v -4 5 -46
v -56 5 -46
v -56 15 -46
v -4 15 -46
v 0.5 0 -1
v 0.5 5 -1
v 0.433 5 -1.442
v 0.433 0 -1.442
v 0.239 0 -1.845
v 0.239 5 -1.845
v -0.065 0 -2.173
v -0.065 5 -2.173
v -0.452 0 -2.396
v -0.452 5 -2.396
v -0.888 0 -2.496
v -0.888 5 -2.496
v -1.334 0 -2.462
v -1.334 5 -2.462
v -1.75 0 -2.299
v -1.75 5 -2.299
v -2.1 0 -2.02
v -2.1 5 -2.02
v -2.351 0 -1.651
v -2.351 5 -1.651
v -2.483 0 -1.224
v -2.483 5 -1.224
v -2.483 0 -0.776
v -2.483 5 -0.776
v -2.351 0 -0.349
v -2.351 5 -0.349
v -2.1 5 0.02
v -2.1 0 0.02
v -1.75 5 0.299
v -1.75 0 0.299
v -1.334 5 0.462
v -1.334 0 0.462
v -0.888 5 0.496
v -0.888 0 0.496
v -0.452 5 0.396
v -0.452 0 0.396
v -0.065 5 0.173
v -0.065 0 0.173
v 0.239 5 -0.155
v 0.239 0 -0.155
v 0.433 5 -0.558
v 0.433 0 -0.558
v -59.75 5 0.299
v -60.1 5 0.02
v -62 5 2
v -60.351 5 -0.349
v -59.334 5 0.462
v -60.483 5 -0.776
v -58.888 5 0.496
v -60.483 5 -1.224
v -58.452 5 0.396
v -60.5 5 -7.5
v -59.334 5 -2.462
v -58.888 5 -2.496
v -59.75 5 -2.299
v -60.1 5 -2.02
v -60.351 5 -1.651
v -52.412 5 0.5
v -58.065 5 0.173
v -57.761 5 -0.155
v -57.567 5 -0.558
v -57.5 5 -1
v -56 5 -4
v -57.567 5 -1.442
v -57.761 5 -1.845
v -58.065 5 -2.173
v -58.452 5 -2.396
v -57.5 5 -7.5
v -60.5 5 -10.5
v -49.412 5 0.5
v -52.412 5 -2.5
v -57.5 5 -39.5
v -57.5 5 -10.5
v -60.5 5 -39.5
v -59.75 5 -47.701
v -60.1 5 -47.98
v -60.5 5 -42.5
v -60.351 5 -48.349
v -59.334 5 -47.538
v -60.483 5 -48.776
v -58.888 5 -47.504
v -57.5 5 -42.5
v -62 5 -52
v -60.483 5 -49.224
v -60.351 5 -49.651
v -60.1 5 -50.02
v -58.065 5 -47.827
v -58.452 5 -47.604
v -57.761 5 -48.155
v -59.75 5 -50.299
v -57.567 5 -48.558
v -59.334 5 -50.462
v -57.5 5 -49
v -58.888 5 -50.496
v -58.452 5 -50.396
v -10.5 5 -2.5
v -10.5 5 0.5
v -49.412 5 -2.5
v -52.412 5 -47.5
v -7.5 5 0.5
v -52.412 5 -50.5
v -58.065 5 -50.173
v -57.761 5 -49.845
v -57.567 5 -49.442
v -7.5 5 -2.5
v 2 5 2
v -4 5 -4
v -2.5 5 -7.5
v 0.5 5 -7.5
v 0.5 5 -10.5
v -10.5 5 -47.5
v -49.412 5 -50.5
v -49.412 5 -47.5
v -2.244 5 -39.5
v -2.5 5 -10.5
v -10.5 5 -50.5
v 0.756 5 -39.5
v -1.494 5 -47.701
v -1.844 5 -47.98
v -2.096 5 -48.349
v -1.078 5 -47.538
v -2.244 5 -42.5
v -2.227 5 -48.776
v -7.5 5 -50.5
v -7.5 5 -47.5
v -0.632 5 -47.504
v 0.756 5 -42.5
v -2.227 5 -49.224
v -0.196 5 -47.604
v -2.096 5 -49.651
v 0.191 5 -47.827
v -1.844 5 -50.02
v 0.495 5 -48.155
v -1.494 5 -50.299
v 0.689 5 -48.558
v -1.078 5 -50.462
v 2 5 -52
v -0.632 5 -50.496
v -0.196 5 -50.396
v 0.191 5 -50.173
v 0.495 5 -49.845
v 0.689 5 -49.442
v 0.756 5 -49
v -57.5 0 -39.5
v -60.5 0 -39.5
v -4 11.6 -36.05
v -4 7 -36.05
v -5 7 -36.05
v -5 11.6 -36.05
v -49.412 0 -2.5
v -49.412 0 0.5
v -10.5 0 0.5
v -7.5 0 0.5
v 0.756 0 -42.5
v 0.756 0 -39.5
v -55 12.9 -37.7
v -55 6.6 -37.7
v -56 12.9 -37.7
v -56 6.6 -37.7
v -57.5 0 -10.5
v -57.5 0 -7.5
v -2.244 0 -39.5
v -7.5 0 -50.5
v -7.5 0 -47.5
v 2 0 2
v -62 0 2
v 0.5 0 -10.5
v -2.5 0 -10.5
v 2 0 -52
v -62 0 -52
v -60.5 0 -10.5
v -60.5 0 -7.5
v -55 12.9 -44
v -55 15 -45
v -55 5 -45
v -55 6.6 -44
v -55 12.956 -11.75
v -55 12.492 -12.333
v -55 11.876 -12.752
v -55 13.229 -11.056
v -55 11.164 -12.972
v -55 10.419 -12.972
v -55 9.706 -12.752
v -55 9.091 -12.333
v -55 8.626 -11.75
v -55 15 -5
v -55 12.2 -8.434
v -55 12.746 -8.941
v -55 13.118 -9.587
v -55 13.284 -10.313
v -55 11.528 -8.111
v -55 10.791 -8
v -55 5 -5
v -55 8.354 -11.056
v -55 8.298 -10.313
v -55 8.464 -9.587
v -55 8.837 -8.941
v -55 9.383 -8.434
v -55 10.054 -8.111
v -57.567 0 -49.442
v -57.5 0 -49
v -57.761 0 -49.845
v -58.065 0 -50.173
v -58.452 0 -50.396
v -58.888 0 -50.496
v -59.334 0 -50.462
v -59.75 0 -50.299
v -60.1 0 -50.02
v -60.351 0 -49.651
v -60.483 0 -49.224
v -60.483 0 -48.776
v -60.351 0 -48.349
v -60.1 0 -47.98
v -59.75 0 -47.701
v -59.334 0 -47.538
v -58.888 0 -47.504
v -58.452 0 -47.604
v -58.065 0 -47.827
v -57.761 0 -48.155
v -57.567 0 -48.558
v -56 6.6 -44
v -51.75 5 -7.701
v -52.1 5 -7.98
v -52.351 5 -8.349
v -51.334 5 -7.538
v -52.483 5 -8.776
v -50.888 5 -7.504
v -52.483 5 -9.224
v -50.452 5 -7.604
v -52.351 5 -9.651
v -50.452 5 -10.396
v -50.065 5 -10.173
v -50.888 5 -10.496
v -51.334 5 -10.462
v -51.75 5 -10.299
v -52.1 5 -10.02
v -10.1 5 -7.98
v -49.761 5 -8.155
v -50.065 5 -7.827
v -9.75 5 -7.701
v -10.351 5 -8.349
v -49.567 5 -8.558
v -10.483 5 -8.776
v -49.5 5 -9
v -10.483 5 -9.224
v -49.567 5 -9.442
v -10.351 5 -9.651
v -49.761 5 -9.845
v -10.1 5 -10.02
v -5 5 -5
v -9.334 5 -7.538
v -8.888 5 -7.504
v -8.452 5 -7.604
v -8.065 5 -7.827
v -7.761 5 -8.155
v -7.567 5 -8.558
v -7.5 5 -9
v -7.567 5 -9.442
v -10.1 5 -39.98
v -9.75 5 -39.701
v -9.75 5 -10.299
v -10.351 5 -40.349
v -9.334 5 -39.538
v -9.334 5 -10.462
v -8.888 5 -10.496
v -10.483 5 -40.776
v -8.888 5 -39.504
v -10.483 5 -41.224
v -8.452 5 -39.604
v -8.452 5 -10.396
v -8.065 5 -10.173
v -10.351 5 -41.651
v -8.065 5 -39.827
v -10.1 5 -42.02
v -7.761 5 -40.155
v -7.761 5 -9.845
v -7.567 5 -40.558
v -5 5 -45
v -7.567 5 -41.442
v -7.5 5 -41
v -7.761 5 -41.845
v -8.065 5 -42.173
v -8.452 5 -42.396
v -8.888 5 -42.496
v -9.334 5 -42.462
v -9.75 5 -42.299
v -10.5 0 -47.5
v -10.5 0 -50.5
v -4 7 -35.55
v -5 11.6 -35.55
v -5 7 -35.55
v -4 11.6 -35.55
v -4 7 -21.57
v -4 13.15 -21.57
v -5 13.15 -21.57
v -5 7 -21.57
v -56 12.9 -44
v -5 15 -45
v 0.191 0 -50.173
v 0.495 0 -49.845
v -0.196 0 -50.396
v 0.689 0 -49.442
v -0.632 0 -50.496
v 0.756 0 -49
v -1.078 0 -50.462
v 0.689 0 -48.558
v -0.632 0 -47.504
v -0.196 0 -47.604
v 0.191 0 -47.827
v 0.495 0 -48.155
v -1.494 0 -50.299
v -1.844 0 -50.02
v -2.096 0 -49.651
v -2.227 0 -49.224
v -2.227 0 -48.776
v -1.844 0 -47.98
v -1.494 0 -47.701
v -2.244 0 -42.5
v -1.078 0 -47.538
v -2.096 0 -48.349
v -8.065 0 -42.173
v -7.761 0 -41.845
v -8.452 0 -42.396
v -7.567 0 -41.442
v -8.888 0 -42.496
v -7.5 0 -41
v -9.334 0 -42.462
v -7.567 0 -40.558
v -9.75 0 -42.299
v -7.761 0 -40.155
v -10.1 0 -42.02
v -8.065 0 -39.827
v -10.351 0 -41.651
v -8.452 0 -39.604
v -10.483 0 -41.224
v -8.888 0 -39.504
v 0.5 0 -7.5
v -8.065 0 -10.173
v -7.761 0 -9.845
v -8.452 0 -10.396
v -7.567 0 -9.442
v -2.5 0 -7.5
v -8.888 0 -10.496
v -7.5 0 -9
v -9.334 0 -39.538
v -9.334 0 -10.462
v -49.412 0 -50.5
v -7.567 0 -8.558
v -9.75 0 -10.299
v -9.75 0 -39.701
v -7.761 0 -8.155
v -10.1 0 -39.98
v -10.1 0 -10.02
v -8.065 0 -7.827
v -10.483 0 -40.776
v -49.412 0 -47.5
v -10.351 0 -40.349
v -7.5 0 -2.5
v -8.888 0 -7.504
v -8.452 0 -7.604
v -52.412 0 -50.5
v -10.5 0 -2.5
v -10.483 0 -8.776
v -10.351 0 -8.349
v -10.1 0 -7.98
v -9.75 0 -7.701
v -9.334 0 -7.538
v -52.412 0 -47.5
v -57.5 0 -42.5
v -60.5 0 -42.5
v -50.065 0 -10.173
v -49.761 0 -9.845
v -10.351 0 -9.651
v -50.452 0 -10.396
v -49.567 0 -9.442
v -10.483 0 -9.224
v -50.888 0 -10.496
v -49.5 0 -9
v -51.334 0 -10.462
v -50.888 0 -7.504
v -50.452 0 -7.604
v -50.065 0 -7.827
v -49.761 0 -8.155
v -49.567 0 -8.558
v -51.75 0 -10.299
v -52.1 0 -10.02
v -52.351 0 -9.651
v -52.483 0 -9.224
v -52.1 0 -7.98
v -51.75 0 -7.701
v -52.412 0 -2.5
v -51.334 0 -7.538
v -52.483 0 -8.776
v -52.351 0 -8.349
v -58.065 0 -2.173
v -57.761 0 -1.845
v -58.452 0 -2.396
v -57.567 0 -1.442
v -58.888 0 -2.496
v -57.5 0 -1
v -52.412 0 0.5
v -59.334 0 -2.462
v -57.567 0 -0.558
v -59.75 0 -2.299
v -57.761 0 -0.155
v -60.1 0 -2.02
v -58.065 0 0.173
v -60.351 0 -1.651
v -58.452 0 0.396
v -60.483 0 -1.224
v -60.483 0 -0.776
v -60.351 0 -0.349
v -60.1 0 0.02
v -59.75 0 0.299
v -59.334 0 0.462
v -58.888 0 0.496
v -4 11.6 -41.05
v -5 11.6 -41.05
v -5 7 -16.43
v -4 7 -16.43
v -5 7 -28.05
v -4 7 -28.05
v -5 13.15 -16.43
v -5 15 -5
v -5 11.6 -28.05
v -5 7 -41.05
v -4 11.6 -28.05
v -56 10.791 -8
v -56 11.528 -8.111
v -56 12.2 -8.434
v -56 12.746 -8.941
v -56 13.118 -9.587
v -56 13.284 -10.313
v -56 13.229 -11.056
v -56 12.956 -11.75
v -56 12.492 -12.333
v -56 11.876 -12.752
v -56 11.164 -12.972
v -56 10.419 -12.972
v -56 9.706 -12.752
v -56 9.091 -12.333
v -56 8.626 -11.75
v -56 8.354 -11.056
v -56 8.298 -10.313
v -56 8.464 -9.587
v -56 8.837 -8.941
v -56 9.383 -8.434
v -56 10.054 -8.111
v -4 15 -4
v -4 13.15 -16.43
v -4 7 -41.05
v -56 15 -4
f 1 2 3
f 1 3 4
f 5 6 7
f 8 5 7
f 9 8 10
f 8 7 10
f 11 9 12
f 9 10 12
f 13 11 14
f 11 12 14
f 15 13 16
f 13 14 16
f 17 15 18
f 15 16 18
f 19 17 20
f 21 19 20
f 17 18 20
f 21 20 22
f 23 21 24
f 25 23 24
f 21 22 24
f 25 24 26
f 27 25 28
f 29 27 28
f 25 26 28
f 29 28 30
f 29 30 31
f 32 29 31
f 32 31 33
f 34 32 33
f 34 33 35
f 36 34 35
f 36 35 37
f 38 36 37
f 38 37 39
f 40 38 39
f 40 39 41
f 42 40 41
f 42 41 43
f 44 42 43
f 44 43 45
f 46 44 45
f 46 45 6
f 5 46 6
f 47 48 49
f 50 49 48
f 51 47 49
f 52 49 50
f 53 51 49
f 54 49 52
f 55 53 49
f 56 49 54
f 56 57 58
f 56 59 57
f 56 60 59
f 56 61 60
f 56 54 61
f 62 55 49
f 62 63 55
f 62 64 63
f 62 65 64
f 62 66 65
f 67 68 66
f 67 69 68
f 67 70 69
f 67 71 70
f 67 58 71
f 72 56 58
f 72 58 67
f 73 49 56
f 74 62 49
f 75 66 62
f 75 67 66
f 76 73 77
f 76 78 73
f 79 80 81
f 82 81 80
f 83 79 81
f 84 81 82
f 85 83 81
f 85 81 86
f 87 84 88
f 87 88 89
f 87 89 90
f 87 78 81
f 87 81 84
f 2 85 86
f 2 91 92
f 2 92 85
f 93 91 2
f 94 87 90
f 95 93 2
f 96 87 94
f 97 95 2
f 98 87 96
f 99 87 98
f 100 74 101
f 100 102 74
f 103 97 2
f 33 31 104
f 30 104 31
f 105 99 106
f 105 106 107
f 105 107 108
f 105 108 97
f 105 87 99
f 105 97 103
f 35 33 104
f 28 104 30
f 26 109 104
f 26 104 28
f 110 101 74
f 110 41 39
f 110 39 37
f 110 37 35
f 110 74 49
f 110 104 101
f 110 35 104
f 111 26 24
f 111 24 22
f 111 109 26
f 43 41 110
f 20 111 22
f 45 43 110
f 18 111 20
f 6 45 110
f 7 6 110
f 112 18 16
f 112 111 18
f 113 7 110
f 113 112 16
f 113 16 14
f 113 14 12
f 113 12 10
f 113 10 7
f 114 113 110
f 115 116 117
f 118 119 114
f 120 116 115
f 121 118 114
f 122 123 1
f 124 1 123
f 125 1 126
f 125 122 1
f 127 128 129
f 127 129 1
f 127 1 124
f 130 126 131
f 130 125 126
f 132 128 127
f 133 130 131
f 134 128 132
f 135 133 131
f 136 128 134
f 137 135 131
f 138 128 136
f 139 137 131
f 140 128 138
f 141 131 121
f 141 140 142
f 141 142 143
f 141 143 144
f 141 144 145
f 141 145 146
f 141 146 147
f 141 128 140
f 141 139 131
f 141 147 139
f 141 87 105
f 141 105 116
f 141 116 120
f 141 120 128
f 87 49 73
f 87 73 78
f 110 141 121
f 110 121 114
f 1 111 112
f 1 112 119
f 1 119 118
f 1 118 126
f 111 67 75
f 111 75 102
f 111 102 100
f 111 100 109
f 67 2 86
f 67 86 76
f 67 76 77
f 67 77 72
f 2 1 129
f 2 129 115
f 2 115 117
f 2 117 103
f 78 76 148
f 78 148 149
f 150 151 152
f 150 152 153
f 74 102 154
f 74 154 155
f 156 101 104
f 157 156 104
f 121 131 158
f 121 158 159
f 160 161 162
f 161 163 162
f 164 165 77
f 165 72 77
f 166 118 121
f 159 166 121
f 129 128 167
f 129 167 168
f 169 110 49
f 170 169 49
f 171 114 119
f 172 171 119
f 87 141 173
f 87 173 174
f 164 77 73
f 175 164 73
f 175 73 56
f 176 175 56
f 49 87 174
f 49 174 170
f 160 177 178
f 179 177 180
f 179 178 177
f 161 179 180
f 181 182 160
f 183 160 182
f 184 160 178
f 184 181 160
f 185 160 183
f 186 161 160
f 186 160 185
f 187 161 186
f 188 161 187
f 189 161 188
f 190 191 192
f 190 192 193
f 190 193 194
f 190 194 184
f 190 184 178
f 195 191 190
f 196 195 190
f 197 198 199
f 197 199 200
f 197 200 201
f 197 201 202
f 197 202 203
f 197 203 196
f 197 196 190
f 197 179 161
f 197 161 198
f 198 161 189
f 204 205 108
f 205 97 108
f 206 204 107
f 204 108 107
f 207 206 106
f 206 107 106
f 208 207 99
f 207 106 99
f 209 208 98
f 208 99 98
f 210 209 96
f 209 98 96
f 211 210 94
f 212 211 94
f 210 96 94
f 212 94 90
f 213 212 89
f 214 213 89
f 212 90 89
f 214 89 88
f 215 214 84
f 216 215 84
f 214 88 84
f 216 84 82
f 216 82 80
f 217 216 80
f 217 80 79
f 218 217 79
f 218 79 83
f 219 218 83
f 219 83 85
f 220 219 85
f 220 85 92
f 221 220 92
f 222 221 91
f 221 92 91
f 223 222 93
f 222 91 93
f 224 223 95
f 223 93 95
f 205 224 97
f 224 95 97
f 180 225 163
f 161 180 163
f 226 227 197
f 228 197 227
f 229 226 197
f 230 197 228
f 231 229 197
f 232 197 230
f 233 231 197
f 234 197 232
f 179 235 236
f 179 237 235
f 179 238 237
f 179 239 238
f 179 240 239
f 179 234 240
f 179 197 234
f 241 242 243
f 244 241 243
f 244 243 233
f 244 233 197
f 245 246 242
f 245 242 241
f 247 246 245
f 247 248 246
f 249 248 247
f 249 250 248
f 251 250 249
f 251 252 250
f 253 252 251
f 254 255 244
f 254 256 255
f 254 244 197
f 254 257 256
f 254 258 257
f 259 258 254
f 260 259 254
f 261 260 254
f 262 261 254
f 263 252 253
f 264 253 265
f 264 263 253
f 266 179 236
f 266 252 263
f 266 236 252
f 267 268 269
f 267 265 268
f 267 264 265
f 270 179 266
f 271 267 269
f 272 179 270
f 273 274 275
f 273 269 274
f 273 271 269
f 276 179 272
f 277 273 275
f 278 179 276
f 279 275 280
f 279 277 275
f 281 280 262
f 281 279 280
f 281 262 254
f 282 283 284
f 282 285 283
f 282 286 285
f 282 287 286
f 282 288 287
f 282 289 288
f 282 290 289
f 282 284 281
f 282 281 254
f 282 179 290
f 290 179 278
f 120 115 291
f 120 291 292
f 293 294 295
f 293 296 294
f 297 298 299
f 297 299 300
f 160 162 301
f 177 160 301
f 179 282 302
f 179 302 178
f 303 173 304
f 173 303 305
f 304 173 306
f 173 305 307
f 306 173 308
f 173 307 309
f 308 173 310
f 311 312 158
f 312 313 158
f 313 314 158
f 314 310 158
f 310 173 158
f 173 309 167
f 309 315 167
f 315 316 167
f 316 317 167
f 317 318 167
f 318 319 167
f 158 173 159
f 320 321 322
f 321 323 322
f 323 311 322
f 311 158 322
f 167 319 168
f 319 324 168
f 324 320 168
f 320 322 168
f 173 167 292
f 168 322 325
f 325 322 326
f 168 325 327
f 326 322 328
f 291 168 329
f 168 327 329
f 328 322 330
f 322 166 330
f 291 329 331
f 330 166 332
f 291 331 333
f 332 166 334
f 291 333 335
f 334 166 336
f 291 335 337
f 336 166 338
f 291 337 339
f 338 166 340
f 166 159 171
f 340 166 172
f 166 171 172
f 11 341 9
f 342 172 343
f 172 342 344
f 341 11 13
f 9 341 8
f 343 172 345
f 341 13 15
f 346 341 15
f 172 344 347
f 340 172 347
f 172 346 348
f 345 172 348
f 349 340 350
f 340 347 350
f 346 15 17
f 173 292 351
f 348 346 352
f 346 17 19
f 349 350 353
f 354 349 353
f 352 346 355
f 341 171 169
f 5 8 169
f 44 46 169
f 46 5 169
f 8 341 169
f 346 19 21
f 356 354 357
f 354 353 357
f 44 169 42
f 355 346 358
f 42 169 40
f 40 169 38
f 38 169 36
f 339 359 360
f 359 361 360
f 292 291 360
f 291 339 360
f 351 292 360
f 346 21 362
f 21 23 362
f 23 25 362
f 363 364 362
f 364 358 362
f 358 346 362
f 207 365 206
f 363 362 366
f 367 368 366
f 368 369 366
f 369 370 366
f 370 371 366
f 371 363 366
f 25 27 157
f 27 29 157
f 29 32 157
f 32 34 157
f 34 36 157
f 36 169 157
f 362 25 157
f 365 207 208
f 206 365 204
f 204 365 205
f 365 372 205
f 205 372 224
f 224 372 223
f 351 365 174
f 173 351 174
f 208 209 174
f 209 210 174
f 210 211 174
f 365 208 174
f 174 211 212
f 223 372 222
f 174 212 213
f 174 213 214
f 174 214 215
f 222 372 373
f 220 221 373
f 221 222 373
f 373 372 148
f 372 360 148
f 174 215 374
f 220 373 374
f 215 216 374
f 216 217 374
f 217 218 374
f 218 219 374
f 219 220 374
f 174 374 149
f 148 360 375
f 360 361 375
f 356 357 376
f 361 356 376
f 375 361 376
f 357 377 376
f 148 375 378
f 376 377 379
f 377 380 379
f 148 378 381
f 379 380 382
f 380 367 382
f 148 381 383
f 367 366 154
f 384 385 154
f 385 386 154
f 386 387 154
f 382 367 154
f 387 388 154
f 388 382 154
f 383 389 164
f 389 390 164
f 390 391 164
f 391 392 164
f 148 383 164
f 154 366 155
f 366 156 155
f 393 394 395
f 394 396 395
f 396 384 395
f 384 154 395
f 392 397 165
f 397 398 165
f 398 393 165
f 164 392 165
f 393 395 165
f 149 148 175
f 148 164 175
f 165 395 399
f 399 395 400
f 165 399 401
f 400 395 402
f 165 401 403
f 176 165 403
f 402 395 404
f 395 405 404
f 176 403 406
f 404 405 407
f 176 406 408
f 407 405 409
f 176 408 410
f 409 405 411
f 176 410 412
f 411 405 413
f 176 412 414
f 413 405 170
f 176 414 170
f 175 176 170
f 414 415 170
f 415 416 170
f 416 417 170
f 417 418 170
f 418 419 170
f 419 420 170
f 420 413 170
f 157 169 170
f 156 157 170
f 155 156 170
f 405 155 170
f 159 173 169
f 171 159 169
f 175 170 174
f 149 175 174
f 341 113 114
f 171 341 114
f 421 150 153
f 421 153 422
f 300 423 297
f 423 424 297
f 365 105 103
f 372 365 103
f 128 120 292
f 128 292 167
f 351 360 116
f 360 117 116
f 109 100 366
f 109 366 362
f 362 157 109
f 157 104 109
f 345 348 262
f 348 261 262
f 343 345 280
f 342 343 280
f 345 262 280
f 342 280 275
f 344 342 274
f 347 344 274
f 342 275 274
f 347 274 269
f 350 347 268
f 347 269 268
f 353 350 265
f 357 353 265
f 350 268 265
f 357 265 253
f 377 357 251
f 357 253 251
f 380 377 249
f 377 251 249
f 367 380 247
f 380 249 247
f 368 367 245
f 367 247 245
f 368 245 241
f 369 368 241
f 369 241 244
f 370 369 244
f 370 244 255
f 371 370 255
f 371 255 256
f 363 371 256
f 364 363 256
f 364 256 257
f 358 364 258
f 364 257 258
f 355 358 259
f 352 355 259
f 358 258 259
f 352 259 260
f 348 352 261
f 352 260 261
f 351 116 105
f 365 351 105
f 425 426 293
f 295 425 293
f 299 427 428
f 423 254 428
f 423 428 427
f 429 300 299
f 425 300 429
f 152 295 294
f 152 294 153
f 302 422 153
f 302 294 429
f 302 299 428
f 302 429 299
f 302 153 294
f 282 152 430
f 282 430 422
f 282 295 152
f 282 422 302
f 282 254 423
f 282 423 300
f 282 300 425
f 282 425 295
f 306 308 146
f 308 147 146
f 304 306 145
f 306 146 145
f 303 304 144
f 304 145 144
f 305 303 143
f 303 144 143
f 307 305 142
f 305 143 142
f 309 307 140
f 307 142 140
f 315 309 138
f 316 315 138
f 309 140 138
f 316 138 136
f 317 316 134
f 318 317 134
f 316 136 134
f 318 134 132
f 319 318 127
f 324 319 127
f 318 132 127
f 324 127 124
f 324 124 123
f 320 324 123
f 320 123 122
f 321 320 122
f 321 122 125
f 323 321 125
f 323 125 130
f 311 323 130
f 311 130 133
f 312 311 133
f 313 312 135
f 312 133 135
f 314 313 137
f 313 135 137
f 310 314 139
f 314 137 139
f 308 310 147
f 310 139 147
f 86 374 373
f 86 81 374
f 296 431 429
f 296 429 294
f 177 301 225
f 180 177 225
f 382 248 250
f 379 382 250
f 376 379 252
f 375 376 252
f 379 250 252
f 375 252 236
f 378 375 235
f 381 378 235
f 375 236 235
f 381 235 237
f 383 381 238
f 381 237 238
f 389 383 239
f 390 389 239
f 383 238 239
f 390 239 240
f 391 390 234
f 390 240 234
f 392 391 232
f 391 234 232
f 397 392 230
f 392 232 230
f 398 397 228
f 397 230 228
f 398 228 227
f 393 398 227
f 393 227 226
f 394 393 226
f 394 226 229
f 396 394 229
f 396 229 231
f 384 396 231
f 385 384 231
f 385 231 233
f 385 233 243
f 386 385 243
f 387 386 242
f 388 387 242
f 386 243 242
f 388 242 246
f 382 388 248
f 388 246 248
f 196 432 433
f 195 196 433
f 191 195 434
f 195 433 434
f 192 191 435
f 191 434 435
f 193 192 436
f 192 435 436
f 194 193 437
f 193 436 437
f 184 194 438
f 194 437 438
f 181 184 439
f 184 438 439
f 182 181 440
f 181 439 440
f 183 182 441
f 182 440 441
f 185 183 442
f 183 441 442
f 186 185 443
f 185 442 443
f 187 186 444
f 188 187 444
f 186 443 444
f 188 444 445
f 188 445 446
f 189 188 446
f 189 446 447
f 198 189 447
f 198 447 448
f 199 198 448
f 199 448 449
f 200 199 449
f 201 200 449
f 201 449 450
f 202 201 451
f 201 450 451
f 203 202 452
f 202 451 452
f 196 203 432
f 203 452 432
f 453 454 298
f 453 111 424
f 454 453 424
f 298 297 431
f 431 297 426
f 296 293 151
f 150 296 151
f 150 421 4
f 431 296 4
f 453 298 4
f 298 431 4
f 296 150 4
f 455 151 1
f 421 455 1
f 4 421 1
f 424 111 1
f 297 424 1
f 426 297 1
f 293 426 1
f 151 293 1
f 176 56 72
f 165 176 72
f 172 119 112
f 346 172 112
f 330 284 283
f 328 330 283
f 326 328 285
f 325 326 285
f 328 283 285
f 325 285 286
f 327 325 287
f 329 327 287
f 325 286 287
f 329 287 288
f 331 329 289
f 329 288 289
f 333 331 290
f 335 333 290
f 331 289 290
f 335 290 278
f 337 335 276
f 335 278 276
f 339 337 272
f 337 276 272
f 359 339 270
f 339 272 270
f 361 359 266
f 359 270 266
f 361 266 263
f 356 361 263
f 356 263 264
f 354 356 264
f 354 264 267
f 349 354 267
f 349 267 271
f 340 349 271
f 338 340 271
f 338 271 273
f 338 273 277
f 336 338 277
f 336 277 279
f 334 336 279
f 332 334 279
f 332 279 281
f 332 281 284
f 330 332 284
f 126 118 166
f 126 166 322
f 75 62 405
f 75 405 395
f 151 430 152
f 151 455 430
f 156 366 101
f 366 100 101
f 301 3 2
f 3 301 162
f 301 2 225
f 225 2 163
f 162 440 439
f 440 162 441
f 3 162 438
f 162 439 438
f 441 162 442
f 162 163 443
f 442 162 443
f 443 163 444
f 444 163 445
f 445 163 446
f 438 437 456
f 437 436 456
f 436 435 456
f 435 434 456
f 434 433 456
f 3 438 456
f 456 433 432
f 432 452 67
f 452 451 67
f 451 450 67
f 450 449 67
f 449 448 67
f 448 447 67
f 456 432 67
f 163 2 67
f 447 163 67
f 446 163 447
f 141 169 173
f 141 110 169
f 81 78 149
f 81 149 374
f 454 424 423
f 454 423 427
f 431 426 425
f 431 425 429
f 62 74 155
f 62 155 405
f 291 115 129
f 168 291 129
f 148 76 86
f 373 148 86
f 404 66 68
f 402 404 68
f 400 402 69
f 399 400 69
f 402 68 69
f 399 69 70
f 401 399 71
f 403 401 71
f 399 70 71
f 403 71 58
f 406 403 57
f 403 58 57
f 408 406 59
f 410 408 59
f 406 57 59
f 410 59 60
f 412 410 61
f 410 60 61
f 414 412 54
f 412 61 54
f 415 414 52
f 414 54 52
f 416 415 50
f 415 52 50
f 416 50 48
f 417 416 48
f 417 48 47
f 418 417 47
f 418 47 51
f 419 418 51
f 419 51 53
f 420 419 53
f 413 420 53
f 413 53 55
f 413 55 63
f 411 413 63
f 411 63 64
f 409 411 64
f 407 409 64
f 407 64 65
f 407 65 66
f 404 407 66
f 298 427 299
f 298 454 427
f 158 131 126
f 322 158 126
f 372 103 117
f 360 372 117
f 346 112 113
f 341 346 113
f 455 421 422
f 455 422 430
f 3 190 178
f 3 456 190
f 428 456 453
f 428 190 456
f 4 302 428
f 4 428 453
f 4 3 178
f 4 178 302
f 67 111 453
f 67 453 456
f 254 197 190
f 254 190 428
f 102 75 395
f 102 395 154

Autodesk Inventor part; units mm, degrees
ref_plane "YZ Plane" through (0, 0, 0) normal (1, 0, 0) x (0, 1, 0)
ref_plane "XZ Plane" through (0, 0, 0) normal (0, 1, 0) x (-1, 0, 0)
ref_plane "XY Plane" through (0, 0, 0) normal (0, 0, 1) x (1, 0, 0)
sketch "Sketch1" plane through (0, 0, 0) normal (0, 1, 0) x (-1, 0, 0)
  line L0 (0, 0) -> (60, 0)
  line L1 (60, 0) -> (60, -50)
  line L2 (60, -50) -> (0, -50)
  line L3 (0, -50) -> (0, 0)
  line L4 (60, 0) -> (0, 0)
  line L5 (0, 0) -> (0, -5)
  line L6 (0, -5) -> (60, -5)
  line L7 (60, -5) -> (60, 0)
  line L8 (60, 0) -> (55, 0)
  line L9 (55, 0) -> (55, -50)
  line L10 (55, -50) -> (60, -50)
  line L11 (60, -50) -> (60, 0)
  line L12 (60, -50) -> (0, -50)
  line L13 (0, -50) -> (0, -45)
  line L14 (0, -45) -> (60, -45)
  line L15 (60, -45) -> (60, -50)
  line L16 (0, -50) -> (5, -50)
  line L17 (5, -50) -> (5, 0)
  line L18 (5, 0) -> (0, 0)
  line L19 (0, 0) -> (0, -50)
  line L20 (5, -5) -> (55, -5)
  line L21 (55, -5) -> (55, -45)
  line L22 (55, -45) -> (5, -45)
  line L23 (5, -45) -> (5, -5)
  dimension "d0" = 60
  dimension "d1" = 50
  dimension "d2" = 5
  dimension "d3" = 5
  dimension "d4" = 5
  dimension "d5" = 5
  dimension "d6" = 40
  dimension "d7" = 50
extrude "Extrusion1" add sketch "Sketch1" along normal blind 5
sketch "Sketch2" plane through (0, 5, 0) normal (0, 1, 0) x (1, 0, 0)
  line L0 (-60, 50) -> (-60, 0) projected
  line L1 (0, 50) -> (-60, 50) projected
  line L2 (-60, 0) -> (0, 0)
  line L3 (0, 0) -> (0, 50)
  line L4 (0, 50) -> (-60, 50)
  line L5 (-60, 50) -> (-60, 0)
  line L6 (0, 0) -> (0, 50) projected
  line L7 (-60, 0) -> (0, 0)
  line L8 (0, 0) -> (0, 5)
  line L9 (0, 5) -> (-60, 5)
  line L10 (-60, 5) -> (-60, 0)
  line L11 (0, 50) -> (-60, 50)
  line L12 (-60, 50) -> (-60, 45)
  line L13 (-60, 45) -> (0, 45)
  line L14 (0, 45) -> (0, 50)
  line L15 (-60, 0) -> (0, 0) projected
  line L16 (-60, 50) -> (-55, 50)
  line L17 (-55, 50) -> (-55, 0)
  line L18 (-55, 0) -> (-60, 0)
  line L19 (-60, 0) -> (-60, 50)
  line L20 (0, 0) -> (-5, 0)
  line L21 (-5, 0) -> (-5, 50)
  line L22 (-5, 50) -> (0, 50)
  line L23 (0, 50) -> (0, 0)
  line L24 (-55, 5) -> (-56.5, 5)
  line L25 (-56.5, 5) -> (-56.5, 3.5)
  line L26 (-56.5, 3.5) -> (-55, 3.5)
  line L27 (-55, 3.5) -> (-55, 5)
  line L28 (-60, 0) -> (-62, 0)
  line L29 (-62, 0) -> (-62, 50)
  line L30 (-62, 50) -> (-60, 50)
  line L31 (-60, 50) -> (-60, 0)
  line L32 (-62, 0) -> (0, 0)
  line L33 (0, 0) -> (0, -2)
  line L34 (0, -2) -> (-62, -2)
  line L35 (-62, -2) -> (-62, 0)
  line L36 (-62, 50) -> (2, 50)
  line L37 (2, 50) -> (2, 52)
  line L38 (2, 52) -> (-62, 52)
  line L39 (-62, 52) -> (-62, 50)
  line L40 (2, 50) -> (0, 50)
  line L41 (0, 50) -> (0, -2)
  line L42 (0, -2) -> (2, -2)
  line L43 (2, -2) -> (2, 50)
  dimension "d10" = 5
  dimension "d11" = 5
  dimension "d12" = 5
  dimension "d13" = 5
  dimension "d14" = 1.5
  dimension "d15" = 1.5
  dimension "d16" = 2
  dimension "d17" = 2
  dimension "d18" = 64
  dimension "d19" = 2
extrude "Extrusion2" add sketch "Sketch2" against normal blind 5 contours L30 L39 L38 L37 L36 L1 | L0 L28 L29 L30 | L28 L2 L33 L34 L35 | L36 L43 L42 L33 L3
sketch "Sketch3" plane through (0, 5, 0) normal (0, 1, 0) x (1, 0, 0)
  line L0 (2, -2) -> (-62, -2) projected
  line L1 (2, 52) -> (2, -2) projected
  line L2 (-62, -2) -> (2, -2)
  line L3 (2, -2) -> (2, 52)
  line L4 (2, 52) -> (-62, 52)
  line L5 (-62, 52) -> (-62, -2)
  line L6 (-62, -2) -> (2, -2)
  line L7 (2, -2) -> (2, 4)
  line L8 (2, 4) -> (-62, 4)
  line L9 (-62, 4) -> (-62, -2)
  line L10 (2, 52) -> (-62, 52)
  line L11 (-62, 52) -> (-62, 46)
  line L12 (-62, 46) -> (2, 46)
  line L13 (2, 46) -> (2, 52)
  line L14 (-62, -2) -> (-62, 52) projected
  line L15 (-62, 52) -> (-56, 52)
  line L16 (-56, 52) -> (-56, -2)
  line L17 (-56, -2) -> (-62, -2)
  line L18 (-62, -2) -> (-62, 52)
  line L19 (-62, 52) -> (2, 52) projected
  line L20 (2, -2) -> (-4, -2)
  line L21 (-4, -2) -> (-4, 52)
  line L22 (-4, 52) -> (2, 52)
  line L23 (2, 52) -> (2, -2)
  line L24 (-4, 46) -> (-54, 46)
  line L25 (-54, 46) -> (-54, 6)
  line L26 (-54, 6) -> (-4, 6)
  line L27 (-4, 6) -> (-4, 46)
  line L28 (-56, 4) -> (-6, 4)
  line L29 (-6, 4) -> (-6, 44)
  line L30 (-6, 44) -> (-56, 44)
  line L31 (-56, 44) -> (-56, 4)
  line L32 (-56, 4) -> (-5, 4)
  line L33 (-5, 4) -> (-5, 45)
  line L34 (-5, 45) -> (-56, 45)
  line L35 (-56, 45) -> (-56, 4)
  line L36 (-4, 46) -> (-55, 46)
  line L37 (-55, 46) -> (-55, 5)
  line L38 (-55, 5) -> (-4, 5)
  line L39 (-4, 5) -> (-4, 46)
  line L40 (-4, 5) -> (-56, 5)
  line L41 (-56, 5) -> (-56, 4)
  line L42 (-56, 4) -> (-4, 4)
  line L43 (-4, 4) -> (-4, 5)
  line L44 (-56, 4) -> (-55, 4)
  line L45 (-55, 4) -> (-55, 46)
  line L46 (-55, 46) -> (-56, 46)
  line L47 (-56, 46) -> (-56, 4)
  line L48 (-56, 45) -> (-4, 45)
  line L49 (-4, 45) -> (-4, 46)
  line L50 (-4, 46) -> (-56, 46)
  line L51 (-56, 46) -> (-56, 45)
  line L52 (-4, 46) -> (-5, 46)
  line L53 (-5, 46) -> (-5, 4)
  line L54 (-5, 4) -> (-4, 4)
  line L55 (-4, 4) -> (-4, 46)
  point P0 (0, 0)
  point P1 (-4, 4)
  point P2 (-55, 45)
  point P3 (-5, 5)
  point P4 (-55, 5)
  dimension "d22" = 6
  dimension "d23" = 6
  dimension "d24" = 6
  dimension "d25" = 6
  dimension "d26" = 50
  dimension "d27" = 40
  dimension "d28" = 50
  dimension "d29" = 40
  dimension "d30" = 51
  dimension "d31" = 41
  dimension "d32" = 51
  dimension "d33" = 41
  dimension "d34" = 40
  dimension "d35" = 50
extrude "Extrusion3" add sketch "Sketch3" along normal blind 10 contours L8 L33 L38 L21 | L16 L40 L45 L8 | L8 L29 L38 L33 | L38 L33 L26 L21 | L21 L48 L53 L12 | L45 L38 L29 L8 | L16 L30 L37 L40 | L26 L33 L48 L21 | L53 L34 L25 L12 | L16 L34 L37 L30 | L25 L34 L37 L12 | L12 L37 L34 L16
sketch "Sketch5" plane through (0, 5, 0) normal (0, 1, 0) x (1, 0, 0)
  line L0 (-55, 5) -> (-55, 45) projected
  line L1 (-55, 45) -> (-5, 45) projected
  line L2 (-55, 5) -> (-5, 5)
  line L3 (-5, 5) -> (-5, 45)
  line L4 (-5, 45) -> (-55, 45)
  line L5 (-55, 45) -> (-55, 5)
  line L6 (-55, 5) -> (-51, 5)
  line L7 (-55, 9) -> (-55, 5)
  circle A0 centre (-51, 9) radius 1.5
  line L8 (-5, 45) -> (-5, 5) projected
  line L9 (-5, 5) -> (-9, 5)
  line L10 (-5, 9) -> (-5, 5)
  line L11 (-5, 45) -> (-9, 45)
  line L12 (-5, 41) -> (-5, 45)
  line L13 (-55, 45) -> (-51, 45)
  line L14 (-55, 41) -> (-55, 45)
  circle A1 centre (-9, 41) radius 1.5
  circle A2 centre (-9, 9) radius 1.5
  point P0 (0, 0)
extrude "Extrusion4" cut sketch "Sketch5" against normal blind 10 contours A0 | A1 | A2
sketch "Sketch6" plane through (-4, 5, -4) normal (1, 0, 0) x (0, 0, -1)
  line L0 (0, 10) -> (1, 10)
  line L1 (1, 10) -> (1, 0)
  line L2 (1, 0) -> (0, 0)
  line L3 (0, 0) -> (0, 10)
  line L4 (41, 10) -> (42, 10)
  line L5 (42, 10) -> (42, 0)
  line L6 (42, 0) -> (41, 0)
  line L7 (41, 0) -> (41, 10)
  line L8 (1, 0) -> (6, 0)
  line L9 (6, 0) -> (6, 2)
  line L10 (1, 2) -> (1, 0)
  line L11 (6, 2) -> (24, 2)
  line L12 (24, 2) -> (24, 0)
  line L13 (24, 0) -> (6, 0)
  line L14 (6, 0) -> (6, 2)
  line L15 (1, 0) -> (41, 0) projected
  line L16 (6, 2) -> (11.05, 2)
  line L17 (11.05, 0) -> (6, 0)
  line L18 (6, 0) -> (6, 2)
  line L19 (24, 0) -> (18.95, 0)
  line L20 (18.95, 2) -> (24, 2)
  line L21 (24, 2) -> (24, 0)
  line L22 (6, 2) -> (15, 2)
  line L23 (15, 2) -> (15, 0)
  line L24 (15, 0) -> (6, 0)
  line L25 (6, 0) -> (6, 2)
  line L26 (24, 0) -> (15, 0)
  line L27 (15, 0) -> (15, 2)
  line L28 (15, 2) -> (24, 2)
  line L29 (24, 2) -> (24, 0)
  line L30 (15, 2) -> (12.525, 2)
  line L31 (12.525, 2) -> (12.525, 0)
  line L32 (12.525, 0) -> (15, 0)
  line L33 (15, 0) -> (15, 2)
  line L34 (15, 2) -> (17.475, 2)
  line L35 (17.475, 2) -> (17.475, 0)
  line L36 (17.475, 0) -> (15, 0)
  line L37 (15, 0) -> (15, 2)
  line L38 (24, 0) -> (24.05, 0)
  line L39 (24.05, 0) -> (24.05, 2)
  line L40 (24, 2) -> (24, 0)
  line L41 (24.05, 2) -> (31.55, 2)
  line L42 (31.55, 2) -> (31.55, 0)
  line L43 (31.55, 0) -> (24.05, 0)
  line L44 (24.05, 0) -> (24.05, 2)
  line L45 (32.05, 2) -> (32.05, 0)
  line L46 (32.05, 0) -> (31.55, 0)
  line L47 (31.55, 0) -> (31.55, 2)
  line L48 (32.05, 0) -> (37.05, 0)
  line L49 (37.05, 0) -> (37.05, 2)
  line L50 (37.05, 2) -> (32.05, 2)
  line L51 (32.05, 2) -> (32.05, 0)
  line L52 (1, 0) -> (1, 10) projected
  line L53 (41, 0) -> (1, 0)
  line L54 (1, 0) -> (1, 1.6)
  line L55 (1, 1.6) -> (41, 1.6)
  line L56 (41, 1.6) -> (41, 0)
  line L57 (37.05, 2) -> (32.05, 2)
  line L58 (32.05, 2) -> (32.05, 1.6)
  line L59 (32.05, 1.6) -> (37.05, 1.6)
  line L60 (37.05, 1.6) -> (37.05, 2)
  line L61 (37.05, 2) -> (32.05, 2)
  line L62 (32.05, 2) -> (32.05, 1.6)
  line L63 (32.05, 1.6) -> (37.05, 1.6)
  line L64 (37.05, 1.6) -> (37.05, 2)
  line L65 (37.05, 1.6) -> (32.05, 1.6)
  line L66 (32.05, 1.6) -> (32.05, 6.6)
  line L67 (32.05, 6.6) -> (37.05, 6.6)
  line L68 (37.05, 6.6) -> (37.05, 1.6)
  line L69 (17.475, 2) -> (12.525, 2)
  line L70 (12.525, 2) -> (12.525, 1.6)
  line L71 (12.525, 1.6) -> (17.475, 1.6)
  line L72 (17.475, 1.6) -> (17.475, 2)
  line L73 (15, 1.6) -> (17.57, 1.6)
  line L74 (17.57, 1.6) -> (17.57, 2)
  line L75 (17.57, 2) -> (15, 2)
  line L76 (15, 2) -> (15, 1.6)
  line L77 (15, 1.6) -> (12.43, 1.6)
  line L78 (12.43, 1.6) -> (12.43, 2)
  line L79 (12.43, 2) -> (15, 2)
  line L80 (15, 2) -> (15, 1.6)
  line L81 (17.57, 1.6) -> (12.43, 1.6)
  line L82 (12.43, 1.6) -> (12.43, 8.15)
  line L83 (12.43, 8.15) -> (17.57, 8.15)
  line L84 (17.57, 8.15) -> (17.57, 1.6)
  line L85 (31.55, 1.6) -> (24.05, 1.6)
  line L86 (24.05, 1.6) -> (24.05, 6.6)
  line L87 (24.05, 6.6) -> (31.55, 6.6)
  line L88 (31.55, 6.6) -> (31.55, 1.6)
  point P0 (-4, -5)
  point P1 (32.05, 2)
  point P2 (37.05, 2)
  point P3 (24.05, 2)
  point P4 (31.55, 2)
  point P5 (12.43, 2)
  point P6 (17.57, 2)
  dimension "d48" = 5.05
  dimension "d53" = 7.5
  dimension "d54" = 0.5
  dimension "d55" = 5
  dimension "d58" = 1.6
  dimension "d59" = 5
  dimension "d60" = 5
  dimension "d61" = 2.57
  dimension "d62" = 2.57
  dimension "d63" = 6.55
  dimension "d64" = 7.5
sketch "Sketch7" plane through (0, 5, 0) normal (0, 1, 0) x (1, 0, 0)
  point P0 (0, 0)
sketch "Sketch8" plane through (0, 5, 0) normal (0, 1, 0) x (1, 0, 0)
  line L0 (-55, 5) -> (-5, 5) projected
  line L1 (-5, 45) -> (-55, 45) projected
  line L2 (-5, 5) -> (-55, 5)
  line L3 (-55, 5) -> (-55, 45)
  line L4 (-55, 45) -> (-5, 45)
  line L5 (-5, 45) -> (-5, 5)
  circle A0 centre (-51, 9) radius 1.5
  circle A1 centre (-9, 9) radius 1.5
  circle A2 centre (-9, 41) radius 1.5 projected
  circle A3 centre (-9, 41) radius 1.5
  point P0 (0, 0)
sketch "Sketch9" plane through (-4, 5, -4) normal (1, 0, 0) x (0, 0, -1)
  point P0 (-4, -5)
extrude "Extrusion6" cut sketch "Sketch6" against normal blind 10 contours L82 L83 L84 L11 | L86 L87 L88 L41 | L66 L67 L68 L50
sketch "Sketch10" plane through (-56, 5, -46) normal (-1, 0, 0) x (0, 0, 1)
  point P0 (46, -5)
  point P1 (0, 10)
  point P2 (42, 0)
  point P3 (41, 10)
sketch "Sketch11" plane through (-56, 5, -46) normal (-1, 0, 0) x (0, 0, 1)
  line L0 (2, 1.6) -> (8.3, 1.6)
  line L1 (8.3, 1.6) -> (8.3, 7.9)
  line L2 (8.3, 7.9) -> (2, 7.9)
  line L3 (2, 7.9) -> (2, 1.6)
  point P0 (46, -5)
extrude "Extrusion7" cut sketch "Sketch11" against normal blind 10
extrude "Extrusion8" cut sketch "Sketch11" against normal blind 10
sketch "Sketch12" plane through (-56, 5, -46) normal (-1, 0, 0) x (0, 0, 1)
  line L0 (42, 0) -> (42, 10) projected
  line L1 (42, 1.5824) -> (0, 1.5824)
  line L2 (0, 1.5824) -> (0, 10)
  line L3 (0, 10) -> (42, 10)
  line L4 (42, 10) -> (42, 1.5824)
  line L5 (41, 10) -> (1, 10) projected
  line L6 (42, 1.5824) -> (35.5, 1.5824)
  line L7 (35.5, 1.5824) -> (35.5, 10)
  line L8 (35.5, 10) -> (42, 10)
  line L9 (42, 10) -> (42, 1.5824)
  circle A0 centre (35.5, 5.7912) radius 2.5
  point P0 (46, -5)
  dimension "d74" = 6.5
  dimension "d75" = 5
extrude "Extrusion9" cut sketch "Sketch12" against normal blind 10 contours A0 L7 | L7 A0
sketch "Sketch13" plane through (0, 5, 0) normal (0, 1, 0) x (1, 0, 0)
  line L0 (2, 52) -> (2, -2) projected
  line L1 (2, -2) -> (-4, -2)
  line L2 (-4, -2) -> (-4, 4)
  line L3 (-4, 4) -> (2, 4)
  line L4 (2, 4) -> (2, -2)
  line L5 (2, -2) -> (-1, -2)
  line L6 (-1, -2) -> (-1, 1)
  line L7 (-1, 1) -> (2, 1)
  line L8 (2, 1) -> (2, -2)
  circle A0 centre (-1, 1) radius 1.5
  line L9 (2, 52) -> (-4, 52)
  line L10 (-4, 52) -> (-4, 46)
  line L11 (-4, 46) -> (2, 46)
  line L12 (2, 46) -> (2, 52)
  line L13 (2.2559, 52) -> (-0.7441, 52)
  line L14 (-0.7441, 52) -> (-0.7441, 49)
  line L15 (-0.7441, 49) -> (2.2559, 49)
  line L16 (2.2559, 49) -> (2.2559, 52)
  circle A1 centre (-0.7441, 49) radius 1.5
  line L17 (-56, 4) -> (-56, 46) projected
  line L18 (-62, 52) -> (-56, 52)
  line L19 (-56, 52) -> (-56, 46)
  line L20 (-56, 46) -> (-62, 46)
  line L21 (-62, 46) -> (-62, 52)
  line L22 (2, 52) -> (-62, 52) projected
  line L23 (-62, 52) -> (-59, 52)
  line L24 (-59, 52) -> (-59, 49)
  line L25 (-59, 49) -> (-62, 49)
  line L26 (-62, 49) -> (-62, 52)
  circle A2 centre (-59, 49) radius 1.5
  circle A3 centre (-59, 1) radius 1.5
  circle A4 centre (-51, 9) radius 1.5 projected
  line L27 (-51, 10.5) -> (-60.5, 10.5)
  line L28 (-60.5, 10.5) -> (-60.5, 7.5)
  line L29 (-60.5, 7.5) -> (-51, 7.5)
  line L30 (-51, 7.5) -> (-51, 10.5)
  line L31 (-52.4117, 9) -> (-49.4117, 9)
  line L32 (-49.4117, 9) -> (-49.4117, -0.5)
  line L33 (-49.4117, -0.5) -> (-52.4117, -0.5)
  line L34 (-52.4117, -0.5) -> (-52.4117, 9)
  line L35 (-49.4117, -0.5) -> (-52.4117, -0.5)
  line L36 (-52.4117, -0.5) -> (-52.4117, 2.5)
  line L37 (-52.4117, 2.5) -> (-49.4117, 2.5)
  line L38 (-49.4117, 2.5) -> (-49.4117, -0.5)
  line L39 (-60.5, 7.5) -> (-57.5, 7.5)
  line L40 (-57.5, 7.5) -> (-57.5, 10.5)
  line L41 (-57.5, 10.5) -> (-60.5, 10.5)
  line L42 (-60.5, 10.5) -> (-60.5, 7.5)
  circle A5 centre (-9, 9) radius 1.5 projected
  line L43 (-9, 7.5) -> (0.5, 7.5)
  line L44 (0.5, 7.5) -> (0.5, 10.5)
  line L45 (0.5, 10.5) -> (-9, 10.5)
  line L46 (-9, 10.5) -> (-9, 7.5)
  line L47 (-7.5, 9) -> (-10.5, 9)
  line L48 (-10.5, 9) -> (-10.5, -0.5)
  line L49 (-10.5, -0.5) -> (-7.5, -0.5)
  line L50 (-7.5, -0.5) -> (-7.5, 9)
  circle A6 centre (-9, 41) radius 1.5 projected
  line L51 (-9, 39.5) -> (0, 39.5)
  line L52 (0, 39.5) -> (0, 42.5)
  line L53 (0, 42.5) -> (-9, 42.5)
  line L54 (-9, 42.5) -> (-9, 39.5)
  line L55 (1, 42.5) -> (-9, 42.5)
  line L56 (-9, 42.5) -> (-9, 39.5)
  line L57 (-9, 39.5) -> (1, 39.5)
  line L58 (1, 39.5) -> (1, 42.5)
  line L59 (1, 10.5) -> (-9, 10.5)
  line L60 (-9, 10.5) -> (-9, 7.5)
  line L61 (-9, 7.5) -> (1, 7.5)
  line L62 (1, 7.5) -> (1, 10.5)
  line L63 (-7.5, 41) -> (-10.5, 41)
  line L64 (-10.5, 41) -> (-10.5, 50.5)
  line L65 (-10.5, 50.5) -> (-7.5, 50.5)
  line L66 (-7.5, 50.5) -> (-7.5, 41)
  circle A7 centre (-50.9117, 41) radius 1.5
  line L67 (-50.9117, 39.5) -> (-60.5, 39.5)
  line L68 (-60.5, 39.5) -> (-60.5, 42.5)
  line L69 (-60.5, 42.5) -> (-50.9117, 42.5)
  line L70 (-50.9117, 42.5) -> (-50.9117, 39.5)
  line L71 (-52.4117, 41) -> (-49.4117, 41)
  line L72 (-49.4117, 41) -> (-49.4117, 50.5)
  line L73 (-49.4117, 50.5) -> (-52.4117, 50.5)
  line L74 (-52.4117, 50.5) -> (-52.4117, 41)
  line L75 (-60.5, 39.5) -> (-57.5, 39.5)
  line L76 (-57.5, 39.5) -> (-57.5, 42.5)
  line L77 (-57.5, 42.5) -> (-60.5, 42.5)
  line L78 (-60.5, 42.5) -> (-60.5, 39.5)
  line L79 (-49.4117, 50.5) -> (-52.4117, 50.5)
  line L80 (-52.4117, 50.5) -> (-52.4117, 47.5)
  line L81 (-52.4117, 47.5) -> (-49.4117, 47.5)
  line L82 (-49.4117, 47.5) -> (-49.4117, 50.5)
  line L83 (-7.5, 50.5) -> (-10.5, 50.5)
  line L84 (-10.5, 50.5) -> (-10.5, 47.5)
  line L85 (-10.5, 47.5) -> (-7.5, 47.5)
  line L86 (-7.5, 47.5) -> (-7.5, 50.5)
  line L87 (-2.2441, 42.5) -> (0.7559, 42.5)
  line L88 (0.7559, 42.5) -> (0.7559, 39.5)
  line L89 (0.7559, 39.5) -> (-2.2441, 39.5)
  line L90 (-2.2441, 39.5) -> (-2.2441, 42.5)
  line L91 (-2.5, 7.5) -> (0.5, 7.5)
  line L92 (0.5, 7.5) -> (0.5, 10.5)
  line L93 (0.5, 10.5) -> (-2.5, 10.5)
  line L94 (-2.5, 10.5) -> (-2.5, 7.5)
  line L95 (-7.5, -0.5) -> (-10.5, -0.5)
  line L96 (-10.5, -0.5) -> (-10.5, 2.5)
  line L97 (-10.5, 2.5) -> (-7.5, 2.5)
  line L98 (-7.5, 2.5) -> (-7.5, -0.5)
  point P0 (0, 0)
  dimension "d78" = 3
  dimension "d79" = 3
  dimension "d80" = 3
  dimension "d81" = 3
  dimension "d82" = 3
  dimension "d83" = 3
  dimension "d84" = 3
  dimension "d85" = 3
  dimension "d86" = 3
extrude "Extrusion10" cut sketch "Sketch13" against normal blind 10 contours A1 L14 L15 | L15 L14 A1 | A0 L6 L7 | L7 L6 A0 | A2 L25 L24 | L24 L25 A2 | L76 L67 L68 L69 | L74 L73 L72 L81 | L40 L29 L28 L27 | L37 L32 L33 L34 | A3 | L45 L44 L43 L94 | L50 L49 L48 L97 | L90 L53 L52 L51 | L85 L64 L65 L66 | L52 L55 L88 L57
sketch "Sketch14" plane through (0, 15, 0) normal (0, 1, 0) x (1, 0, 0)
  line L0 (-55, 45) -> (-5, 45) projected
  line L1 (-5, 5) -> (-55, 5) projected
  line L2 (-5, 45) -> (-5, 5) projected
  line L3 (-55, 5) -> (-55, 45) projected
  line L4 (-4, 4) -> (-4, 46) projected
  line L5 (-56, 46) -> (-56, 4) projected
  line L6 (-4, 46) -> (-56, 46) projected
  line L7 (-56, 4) -> (-4, 4) projected
  point P0 (0, 0)
  dimension "d89" = 40
  dimension "d90" = 50
  dimension "d91" = 52
  dimension "d92" = 42
properties part number "TNC Case" material "PET Plastic"
